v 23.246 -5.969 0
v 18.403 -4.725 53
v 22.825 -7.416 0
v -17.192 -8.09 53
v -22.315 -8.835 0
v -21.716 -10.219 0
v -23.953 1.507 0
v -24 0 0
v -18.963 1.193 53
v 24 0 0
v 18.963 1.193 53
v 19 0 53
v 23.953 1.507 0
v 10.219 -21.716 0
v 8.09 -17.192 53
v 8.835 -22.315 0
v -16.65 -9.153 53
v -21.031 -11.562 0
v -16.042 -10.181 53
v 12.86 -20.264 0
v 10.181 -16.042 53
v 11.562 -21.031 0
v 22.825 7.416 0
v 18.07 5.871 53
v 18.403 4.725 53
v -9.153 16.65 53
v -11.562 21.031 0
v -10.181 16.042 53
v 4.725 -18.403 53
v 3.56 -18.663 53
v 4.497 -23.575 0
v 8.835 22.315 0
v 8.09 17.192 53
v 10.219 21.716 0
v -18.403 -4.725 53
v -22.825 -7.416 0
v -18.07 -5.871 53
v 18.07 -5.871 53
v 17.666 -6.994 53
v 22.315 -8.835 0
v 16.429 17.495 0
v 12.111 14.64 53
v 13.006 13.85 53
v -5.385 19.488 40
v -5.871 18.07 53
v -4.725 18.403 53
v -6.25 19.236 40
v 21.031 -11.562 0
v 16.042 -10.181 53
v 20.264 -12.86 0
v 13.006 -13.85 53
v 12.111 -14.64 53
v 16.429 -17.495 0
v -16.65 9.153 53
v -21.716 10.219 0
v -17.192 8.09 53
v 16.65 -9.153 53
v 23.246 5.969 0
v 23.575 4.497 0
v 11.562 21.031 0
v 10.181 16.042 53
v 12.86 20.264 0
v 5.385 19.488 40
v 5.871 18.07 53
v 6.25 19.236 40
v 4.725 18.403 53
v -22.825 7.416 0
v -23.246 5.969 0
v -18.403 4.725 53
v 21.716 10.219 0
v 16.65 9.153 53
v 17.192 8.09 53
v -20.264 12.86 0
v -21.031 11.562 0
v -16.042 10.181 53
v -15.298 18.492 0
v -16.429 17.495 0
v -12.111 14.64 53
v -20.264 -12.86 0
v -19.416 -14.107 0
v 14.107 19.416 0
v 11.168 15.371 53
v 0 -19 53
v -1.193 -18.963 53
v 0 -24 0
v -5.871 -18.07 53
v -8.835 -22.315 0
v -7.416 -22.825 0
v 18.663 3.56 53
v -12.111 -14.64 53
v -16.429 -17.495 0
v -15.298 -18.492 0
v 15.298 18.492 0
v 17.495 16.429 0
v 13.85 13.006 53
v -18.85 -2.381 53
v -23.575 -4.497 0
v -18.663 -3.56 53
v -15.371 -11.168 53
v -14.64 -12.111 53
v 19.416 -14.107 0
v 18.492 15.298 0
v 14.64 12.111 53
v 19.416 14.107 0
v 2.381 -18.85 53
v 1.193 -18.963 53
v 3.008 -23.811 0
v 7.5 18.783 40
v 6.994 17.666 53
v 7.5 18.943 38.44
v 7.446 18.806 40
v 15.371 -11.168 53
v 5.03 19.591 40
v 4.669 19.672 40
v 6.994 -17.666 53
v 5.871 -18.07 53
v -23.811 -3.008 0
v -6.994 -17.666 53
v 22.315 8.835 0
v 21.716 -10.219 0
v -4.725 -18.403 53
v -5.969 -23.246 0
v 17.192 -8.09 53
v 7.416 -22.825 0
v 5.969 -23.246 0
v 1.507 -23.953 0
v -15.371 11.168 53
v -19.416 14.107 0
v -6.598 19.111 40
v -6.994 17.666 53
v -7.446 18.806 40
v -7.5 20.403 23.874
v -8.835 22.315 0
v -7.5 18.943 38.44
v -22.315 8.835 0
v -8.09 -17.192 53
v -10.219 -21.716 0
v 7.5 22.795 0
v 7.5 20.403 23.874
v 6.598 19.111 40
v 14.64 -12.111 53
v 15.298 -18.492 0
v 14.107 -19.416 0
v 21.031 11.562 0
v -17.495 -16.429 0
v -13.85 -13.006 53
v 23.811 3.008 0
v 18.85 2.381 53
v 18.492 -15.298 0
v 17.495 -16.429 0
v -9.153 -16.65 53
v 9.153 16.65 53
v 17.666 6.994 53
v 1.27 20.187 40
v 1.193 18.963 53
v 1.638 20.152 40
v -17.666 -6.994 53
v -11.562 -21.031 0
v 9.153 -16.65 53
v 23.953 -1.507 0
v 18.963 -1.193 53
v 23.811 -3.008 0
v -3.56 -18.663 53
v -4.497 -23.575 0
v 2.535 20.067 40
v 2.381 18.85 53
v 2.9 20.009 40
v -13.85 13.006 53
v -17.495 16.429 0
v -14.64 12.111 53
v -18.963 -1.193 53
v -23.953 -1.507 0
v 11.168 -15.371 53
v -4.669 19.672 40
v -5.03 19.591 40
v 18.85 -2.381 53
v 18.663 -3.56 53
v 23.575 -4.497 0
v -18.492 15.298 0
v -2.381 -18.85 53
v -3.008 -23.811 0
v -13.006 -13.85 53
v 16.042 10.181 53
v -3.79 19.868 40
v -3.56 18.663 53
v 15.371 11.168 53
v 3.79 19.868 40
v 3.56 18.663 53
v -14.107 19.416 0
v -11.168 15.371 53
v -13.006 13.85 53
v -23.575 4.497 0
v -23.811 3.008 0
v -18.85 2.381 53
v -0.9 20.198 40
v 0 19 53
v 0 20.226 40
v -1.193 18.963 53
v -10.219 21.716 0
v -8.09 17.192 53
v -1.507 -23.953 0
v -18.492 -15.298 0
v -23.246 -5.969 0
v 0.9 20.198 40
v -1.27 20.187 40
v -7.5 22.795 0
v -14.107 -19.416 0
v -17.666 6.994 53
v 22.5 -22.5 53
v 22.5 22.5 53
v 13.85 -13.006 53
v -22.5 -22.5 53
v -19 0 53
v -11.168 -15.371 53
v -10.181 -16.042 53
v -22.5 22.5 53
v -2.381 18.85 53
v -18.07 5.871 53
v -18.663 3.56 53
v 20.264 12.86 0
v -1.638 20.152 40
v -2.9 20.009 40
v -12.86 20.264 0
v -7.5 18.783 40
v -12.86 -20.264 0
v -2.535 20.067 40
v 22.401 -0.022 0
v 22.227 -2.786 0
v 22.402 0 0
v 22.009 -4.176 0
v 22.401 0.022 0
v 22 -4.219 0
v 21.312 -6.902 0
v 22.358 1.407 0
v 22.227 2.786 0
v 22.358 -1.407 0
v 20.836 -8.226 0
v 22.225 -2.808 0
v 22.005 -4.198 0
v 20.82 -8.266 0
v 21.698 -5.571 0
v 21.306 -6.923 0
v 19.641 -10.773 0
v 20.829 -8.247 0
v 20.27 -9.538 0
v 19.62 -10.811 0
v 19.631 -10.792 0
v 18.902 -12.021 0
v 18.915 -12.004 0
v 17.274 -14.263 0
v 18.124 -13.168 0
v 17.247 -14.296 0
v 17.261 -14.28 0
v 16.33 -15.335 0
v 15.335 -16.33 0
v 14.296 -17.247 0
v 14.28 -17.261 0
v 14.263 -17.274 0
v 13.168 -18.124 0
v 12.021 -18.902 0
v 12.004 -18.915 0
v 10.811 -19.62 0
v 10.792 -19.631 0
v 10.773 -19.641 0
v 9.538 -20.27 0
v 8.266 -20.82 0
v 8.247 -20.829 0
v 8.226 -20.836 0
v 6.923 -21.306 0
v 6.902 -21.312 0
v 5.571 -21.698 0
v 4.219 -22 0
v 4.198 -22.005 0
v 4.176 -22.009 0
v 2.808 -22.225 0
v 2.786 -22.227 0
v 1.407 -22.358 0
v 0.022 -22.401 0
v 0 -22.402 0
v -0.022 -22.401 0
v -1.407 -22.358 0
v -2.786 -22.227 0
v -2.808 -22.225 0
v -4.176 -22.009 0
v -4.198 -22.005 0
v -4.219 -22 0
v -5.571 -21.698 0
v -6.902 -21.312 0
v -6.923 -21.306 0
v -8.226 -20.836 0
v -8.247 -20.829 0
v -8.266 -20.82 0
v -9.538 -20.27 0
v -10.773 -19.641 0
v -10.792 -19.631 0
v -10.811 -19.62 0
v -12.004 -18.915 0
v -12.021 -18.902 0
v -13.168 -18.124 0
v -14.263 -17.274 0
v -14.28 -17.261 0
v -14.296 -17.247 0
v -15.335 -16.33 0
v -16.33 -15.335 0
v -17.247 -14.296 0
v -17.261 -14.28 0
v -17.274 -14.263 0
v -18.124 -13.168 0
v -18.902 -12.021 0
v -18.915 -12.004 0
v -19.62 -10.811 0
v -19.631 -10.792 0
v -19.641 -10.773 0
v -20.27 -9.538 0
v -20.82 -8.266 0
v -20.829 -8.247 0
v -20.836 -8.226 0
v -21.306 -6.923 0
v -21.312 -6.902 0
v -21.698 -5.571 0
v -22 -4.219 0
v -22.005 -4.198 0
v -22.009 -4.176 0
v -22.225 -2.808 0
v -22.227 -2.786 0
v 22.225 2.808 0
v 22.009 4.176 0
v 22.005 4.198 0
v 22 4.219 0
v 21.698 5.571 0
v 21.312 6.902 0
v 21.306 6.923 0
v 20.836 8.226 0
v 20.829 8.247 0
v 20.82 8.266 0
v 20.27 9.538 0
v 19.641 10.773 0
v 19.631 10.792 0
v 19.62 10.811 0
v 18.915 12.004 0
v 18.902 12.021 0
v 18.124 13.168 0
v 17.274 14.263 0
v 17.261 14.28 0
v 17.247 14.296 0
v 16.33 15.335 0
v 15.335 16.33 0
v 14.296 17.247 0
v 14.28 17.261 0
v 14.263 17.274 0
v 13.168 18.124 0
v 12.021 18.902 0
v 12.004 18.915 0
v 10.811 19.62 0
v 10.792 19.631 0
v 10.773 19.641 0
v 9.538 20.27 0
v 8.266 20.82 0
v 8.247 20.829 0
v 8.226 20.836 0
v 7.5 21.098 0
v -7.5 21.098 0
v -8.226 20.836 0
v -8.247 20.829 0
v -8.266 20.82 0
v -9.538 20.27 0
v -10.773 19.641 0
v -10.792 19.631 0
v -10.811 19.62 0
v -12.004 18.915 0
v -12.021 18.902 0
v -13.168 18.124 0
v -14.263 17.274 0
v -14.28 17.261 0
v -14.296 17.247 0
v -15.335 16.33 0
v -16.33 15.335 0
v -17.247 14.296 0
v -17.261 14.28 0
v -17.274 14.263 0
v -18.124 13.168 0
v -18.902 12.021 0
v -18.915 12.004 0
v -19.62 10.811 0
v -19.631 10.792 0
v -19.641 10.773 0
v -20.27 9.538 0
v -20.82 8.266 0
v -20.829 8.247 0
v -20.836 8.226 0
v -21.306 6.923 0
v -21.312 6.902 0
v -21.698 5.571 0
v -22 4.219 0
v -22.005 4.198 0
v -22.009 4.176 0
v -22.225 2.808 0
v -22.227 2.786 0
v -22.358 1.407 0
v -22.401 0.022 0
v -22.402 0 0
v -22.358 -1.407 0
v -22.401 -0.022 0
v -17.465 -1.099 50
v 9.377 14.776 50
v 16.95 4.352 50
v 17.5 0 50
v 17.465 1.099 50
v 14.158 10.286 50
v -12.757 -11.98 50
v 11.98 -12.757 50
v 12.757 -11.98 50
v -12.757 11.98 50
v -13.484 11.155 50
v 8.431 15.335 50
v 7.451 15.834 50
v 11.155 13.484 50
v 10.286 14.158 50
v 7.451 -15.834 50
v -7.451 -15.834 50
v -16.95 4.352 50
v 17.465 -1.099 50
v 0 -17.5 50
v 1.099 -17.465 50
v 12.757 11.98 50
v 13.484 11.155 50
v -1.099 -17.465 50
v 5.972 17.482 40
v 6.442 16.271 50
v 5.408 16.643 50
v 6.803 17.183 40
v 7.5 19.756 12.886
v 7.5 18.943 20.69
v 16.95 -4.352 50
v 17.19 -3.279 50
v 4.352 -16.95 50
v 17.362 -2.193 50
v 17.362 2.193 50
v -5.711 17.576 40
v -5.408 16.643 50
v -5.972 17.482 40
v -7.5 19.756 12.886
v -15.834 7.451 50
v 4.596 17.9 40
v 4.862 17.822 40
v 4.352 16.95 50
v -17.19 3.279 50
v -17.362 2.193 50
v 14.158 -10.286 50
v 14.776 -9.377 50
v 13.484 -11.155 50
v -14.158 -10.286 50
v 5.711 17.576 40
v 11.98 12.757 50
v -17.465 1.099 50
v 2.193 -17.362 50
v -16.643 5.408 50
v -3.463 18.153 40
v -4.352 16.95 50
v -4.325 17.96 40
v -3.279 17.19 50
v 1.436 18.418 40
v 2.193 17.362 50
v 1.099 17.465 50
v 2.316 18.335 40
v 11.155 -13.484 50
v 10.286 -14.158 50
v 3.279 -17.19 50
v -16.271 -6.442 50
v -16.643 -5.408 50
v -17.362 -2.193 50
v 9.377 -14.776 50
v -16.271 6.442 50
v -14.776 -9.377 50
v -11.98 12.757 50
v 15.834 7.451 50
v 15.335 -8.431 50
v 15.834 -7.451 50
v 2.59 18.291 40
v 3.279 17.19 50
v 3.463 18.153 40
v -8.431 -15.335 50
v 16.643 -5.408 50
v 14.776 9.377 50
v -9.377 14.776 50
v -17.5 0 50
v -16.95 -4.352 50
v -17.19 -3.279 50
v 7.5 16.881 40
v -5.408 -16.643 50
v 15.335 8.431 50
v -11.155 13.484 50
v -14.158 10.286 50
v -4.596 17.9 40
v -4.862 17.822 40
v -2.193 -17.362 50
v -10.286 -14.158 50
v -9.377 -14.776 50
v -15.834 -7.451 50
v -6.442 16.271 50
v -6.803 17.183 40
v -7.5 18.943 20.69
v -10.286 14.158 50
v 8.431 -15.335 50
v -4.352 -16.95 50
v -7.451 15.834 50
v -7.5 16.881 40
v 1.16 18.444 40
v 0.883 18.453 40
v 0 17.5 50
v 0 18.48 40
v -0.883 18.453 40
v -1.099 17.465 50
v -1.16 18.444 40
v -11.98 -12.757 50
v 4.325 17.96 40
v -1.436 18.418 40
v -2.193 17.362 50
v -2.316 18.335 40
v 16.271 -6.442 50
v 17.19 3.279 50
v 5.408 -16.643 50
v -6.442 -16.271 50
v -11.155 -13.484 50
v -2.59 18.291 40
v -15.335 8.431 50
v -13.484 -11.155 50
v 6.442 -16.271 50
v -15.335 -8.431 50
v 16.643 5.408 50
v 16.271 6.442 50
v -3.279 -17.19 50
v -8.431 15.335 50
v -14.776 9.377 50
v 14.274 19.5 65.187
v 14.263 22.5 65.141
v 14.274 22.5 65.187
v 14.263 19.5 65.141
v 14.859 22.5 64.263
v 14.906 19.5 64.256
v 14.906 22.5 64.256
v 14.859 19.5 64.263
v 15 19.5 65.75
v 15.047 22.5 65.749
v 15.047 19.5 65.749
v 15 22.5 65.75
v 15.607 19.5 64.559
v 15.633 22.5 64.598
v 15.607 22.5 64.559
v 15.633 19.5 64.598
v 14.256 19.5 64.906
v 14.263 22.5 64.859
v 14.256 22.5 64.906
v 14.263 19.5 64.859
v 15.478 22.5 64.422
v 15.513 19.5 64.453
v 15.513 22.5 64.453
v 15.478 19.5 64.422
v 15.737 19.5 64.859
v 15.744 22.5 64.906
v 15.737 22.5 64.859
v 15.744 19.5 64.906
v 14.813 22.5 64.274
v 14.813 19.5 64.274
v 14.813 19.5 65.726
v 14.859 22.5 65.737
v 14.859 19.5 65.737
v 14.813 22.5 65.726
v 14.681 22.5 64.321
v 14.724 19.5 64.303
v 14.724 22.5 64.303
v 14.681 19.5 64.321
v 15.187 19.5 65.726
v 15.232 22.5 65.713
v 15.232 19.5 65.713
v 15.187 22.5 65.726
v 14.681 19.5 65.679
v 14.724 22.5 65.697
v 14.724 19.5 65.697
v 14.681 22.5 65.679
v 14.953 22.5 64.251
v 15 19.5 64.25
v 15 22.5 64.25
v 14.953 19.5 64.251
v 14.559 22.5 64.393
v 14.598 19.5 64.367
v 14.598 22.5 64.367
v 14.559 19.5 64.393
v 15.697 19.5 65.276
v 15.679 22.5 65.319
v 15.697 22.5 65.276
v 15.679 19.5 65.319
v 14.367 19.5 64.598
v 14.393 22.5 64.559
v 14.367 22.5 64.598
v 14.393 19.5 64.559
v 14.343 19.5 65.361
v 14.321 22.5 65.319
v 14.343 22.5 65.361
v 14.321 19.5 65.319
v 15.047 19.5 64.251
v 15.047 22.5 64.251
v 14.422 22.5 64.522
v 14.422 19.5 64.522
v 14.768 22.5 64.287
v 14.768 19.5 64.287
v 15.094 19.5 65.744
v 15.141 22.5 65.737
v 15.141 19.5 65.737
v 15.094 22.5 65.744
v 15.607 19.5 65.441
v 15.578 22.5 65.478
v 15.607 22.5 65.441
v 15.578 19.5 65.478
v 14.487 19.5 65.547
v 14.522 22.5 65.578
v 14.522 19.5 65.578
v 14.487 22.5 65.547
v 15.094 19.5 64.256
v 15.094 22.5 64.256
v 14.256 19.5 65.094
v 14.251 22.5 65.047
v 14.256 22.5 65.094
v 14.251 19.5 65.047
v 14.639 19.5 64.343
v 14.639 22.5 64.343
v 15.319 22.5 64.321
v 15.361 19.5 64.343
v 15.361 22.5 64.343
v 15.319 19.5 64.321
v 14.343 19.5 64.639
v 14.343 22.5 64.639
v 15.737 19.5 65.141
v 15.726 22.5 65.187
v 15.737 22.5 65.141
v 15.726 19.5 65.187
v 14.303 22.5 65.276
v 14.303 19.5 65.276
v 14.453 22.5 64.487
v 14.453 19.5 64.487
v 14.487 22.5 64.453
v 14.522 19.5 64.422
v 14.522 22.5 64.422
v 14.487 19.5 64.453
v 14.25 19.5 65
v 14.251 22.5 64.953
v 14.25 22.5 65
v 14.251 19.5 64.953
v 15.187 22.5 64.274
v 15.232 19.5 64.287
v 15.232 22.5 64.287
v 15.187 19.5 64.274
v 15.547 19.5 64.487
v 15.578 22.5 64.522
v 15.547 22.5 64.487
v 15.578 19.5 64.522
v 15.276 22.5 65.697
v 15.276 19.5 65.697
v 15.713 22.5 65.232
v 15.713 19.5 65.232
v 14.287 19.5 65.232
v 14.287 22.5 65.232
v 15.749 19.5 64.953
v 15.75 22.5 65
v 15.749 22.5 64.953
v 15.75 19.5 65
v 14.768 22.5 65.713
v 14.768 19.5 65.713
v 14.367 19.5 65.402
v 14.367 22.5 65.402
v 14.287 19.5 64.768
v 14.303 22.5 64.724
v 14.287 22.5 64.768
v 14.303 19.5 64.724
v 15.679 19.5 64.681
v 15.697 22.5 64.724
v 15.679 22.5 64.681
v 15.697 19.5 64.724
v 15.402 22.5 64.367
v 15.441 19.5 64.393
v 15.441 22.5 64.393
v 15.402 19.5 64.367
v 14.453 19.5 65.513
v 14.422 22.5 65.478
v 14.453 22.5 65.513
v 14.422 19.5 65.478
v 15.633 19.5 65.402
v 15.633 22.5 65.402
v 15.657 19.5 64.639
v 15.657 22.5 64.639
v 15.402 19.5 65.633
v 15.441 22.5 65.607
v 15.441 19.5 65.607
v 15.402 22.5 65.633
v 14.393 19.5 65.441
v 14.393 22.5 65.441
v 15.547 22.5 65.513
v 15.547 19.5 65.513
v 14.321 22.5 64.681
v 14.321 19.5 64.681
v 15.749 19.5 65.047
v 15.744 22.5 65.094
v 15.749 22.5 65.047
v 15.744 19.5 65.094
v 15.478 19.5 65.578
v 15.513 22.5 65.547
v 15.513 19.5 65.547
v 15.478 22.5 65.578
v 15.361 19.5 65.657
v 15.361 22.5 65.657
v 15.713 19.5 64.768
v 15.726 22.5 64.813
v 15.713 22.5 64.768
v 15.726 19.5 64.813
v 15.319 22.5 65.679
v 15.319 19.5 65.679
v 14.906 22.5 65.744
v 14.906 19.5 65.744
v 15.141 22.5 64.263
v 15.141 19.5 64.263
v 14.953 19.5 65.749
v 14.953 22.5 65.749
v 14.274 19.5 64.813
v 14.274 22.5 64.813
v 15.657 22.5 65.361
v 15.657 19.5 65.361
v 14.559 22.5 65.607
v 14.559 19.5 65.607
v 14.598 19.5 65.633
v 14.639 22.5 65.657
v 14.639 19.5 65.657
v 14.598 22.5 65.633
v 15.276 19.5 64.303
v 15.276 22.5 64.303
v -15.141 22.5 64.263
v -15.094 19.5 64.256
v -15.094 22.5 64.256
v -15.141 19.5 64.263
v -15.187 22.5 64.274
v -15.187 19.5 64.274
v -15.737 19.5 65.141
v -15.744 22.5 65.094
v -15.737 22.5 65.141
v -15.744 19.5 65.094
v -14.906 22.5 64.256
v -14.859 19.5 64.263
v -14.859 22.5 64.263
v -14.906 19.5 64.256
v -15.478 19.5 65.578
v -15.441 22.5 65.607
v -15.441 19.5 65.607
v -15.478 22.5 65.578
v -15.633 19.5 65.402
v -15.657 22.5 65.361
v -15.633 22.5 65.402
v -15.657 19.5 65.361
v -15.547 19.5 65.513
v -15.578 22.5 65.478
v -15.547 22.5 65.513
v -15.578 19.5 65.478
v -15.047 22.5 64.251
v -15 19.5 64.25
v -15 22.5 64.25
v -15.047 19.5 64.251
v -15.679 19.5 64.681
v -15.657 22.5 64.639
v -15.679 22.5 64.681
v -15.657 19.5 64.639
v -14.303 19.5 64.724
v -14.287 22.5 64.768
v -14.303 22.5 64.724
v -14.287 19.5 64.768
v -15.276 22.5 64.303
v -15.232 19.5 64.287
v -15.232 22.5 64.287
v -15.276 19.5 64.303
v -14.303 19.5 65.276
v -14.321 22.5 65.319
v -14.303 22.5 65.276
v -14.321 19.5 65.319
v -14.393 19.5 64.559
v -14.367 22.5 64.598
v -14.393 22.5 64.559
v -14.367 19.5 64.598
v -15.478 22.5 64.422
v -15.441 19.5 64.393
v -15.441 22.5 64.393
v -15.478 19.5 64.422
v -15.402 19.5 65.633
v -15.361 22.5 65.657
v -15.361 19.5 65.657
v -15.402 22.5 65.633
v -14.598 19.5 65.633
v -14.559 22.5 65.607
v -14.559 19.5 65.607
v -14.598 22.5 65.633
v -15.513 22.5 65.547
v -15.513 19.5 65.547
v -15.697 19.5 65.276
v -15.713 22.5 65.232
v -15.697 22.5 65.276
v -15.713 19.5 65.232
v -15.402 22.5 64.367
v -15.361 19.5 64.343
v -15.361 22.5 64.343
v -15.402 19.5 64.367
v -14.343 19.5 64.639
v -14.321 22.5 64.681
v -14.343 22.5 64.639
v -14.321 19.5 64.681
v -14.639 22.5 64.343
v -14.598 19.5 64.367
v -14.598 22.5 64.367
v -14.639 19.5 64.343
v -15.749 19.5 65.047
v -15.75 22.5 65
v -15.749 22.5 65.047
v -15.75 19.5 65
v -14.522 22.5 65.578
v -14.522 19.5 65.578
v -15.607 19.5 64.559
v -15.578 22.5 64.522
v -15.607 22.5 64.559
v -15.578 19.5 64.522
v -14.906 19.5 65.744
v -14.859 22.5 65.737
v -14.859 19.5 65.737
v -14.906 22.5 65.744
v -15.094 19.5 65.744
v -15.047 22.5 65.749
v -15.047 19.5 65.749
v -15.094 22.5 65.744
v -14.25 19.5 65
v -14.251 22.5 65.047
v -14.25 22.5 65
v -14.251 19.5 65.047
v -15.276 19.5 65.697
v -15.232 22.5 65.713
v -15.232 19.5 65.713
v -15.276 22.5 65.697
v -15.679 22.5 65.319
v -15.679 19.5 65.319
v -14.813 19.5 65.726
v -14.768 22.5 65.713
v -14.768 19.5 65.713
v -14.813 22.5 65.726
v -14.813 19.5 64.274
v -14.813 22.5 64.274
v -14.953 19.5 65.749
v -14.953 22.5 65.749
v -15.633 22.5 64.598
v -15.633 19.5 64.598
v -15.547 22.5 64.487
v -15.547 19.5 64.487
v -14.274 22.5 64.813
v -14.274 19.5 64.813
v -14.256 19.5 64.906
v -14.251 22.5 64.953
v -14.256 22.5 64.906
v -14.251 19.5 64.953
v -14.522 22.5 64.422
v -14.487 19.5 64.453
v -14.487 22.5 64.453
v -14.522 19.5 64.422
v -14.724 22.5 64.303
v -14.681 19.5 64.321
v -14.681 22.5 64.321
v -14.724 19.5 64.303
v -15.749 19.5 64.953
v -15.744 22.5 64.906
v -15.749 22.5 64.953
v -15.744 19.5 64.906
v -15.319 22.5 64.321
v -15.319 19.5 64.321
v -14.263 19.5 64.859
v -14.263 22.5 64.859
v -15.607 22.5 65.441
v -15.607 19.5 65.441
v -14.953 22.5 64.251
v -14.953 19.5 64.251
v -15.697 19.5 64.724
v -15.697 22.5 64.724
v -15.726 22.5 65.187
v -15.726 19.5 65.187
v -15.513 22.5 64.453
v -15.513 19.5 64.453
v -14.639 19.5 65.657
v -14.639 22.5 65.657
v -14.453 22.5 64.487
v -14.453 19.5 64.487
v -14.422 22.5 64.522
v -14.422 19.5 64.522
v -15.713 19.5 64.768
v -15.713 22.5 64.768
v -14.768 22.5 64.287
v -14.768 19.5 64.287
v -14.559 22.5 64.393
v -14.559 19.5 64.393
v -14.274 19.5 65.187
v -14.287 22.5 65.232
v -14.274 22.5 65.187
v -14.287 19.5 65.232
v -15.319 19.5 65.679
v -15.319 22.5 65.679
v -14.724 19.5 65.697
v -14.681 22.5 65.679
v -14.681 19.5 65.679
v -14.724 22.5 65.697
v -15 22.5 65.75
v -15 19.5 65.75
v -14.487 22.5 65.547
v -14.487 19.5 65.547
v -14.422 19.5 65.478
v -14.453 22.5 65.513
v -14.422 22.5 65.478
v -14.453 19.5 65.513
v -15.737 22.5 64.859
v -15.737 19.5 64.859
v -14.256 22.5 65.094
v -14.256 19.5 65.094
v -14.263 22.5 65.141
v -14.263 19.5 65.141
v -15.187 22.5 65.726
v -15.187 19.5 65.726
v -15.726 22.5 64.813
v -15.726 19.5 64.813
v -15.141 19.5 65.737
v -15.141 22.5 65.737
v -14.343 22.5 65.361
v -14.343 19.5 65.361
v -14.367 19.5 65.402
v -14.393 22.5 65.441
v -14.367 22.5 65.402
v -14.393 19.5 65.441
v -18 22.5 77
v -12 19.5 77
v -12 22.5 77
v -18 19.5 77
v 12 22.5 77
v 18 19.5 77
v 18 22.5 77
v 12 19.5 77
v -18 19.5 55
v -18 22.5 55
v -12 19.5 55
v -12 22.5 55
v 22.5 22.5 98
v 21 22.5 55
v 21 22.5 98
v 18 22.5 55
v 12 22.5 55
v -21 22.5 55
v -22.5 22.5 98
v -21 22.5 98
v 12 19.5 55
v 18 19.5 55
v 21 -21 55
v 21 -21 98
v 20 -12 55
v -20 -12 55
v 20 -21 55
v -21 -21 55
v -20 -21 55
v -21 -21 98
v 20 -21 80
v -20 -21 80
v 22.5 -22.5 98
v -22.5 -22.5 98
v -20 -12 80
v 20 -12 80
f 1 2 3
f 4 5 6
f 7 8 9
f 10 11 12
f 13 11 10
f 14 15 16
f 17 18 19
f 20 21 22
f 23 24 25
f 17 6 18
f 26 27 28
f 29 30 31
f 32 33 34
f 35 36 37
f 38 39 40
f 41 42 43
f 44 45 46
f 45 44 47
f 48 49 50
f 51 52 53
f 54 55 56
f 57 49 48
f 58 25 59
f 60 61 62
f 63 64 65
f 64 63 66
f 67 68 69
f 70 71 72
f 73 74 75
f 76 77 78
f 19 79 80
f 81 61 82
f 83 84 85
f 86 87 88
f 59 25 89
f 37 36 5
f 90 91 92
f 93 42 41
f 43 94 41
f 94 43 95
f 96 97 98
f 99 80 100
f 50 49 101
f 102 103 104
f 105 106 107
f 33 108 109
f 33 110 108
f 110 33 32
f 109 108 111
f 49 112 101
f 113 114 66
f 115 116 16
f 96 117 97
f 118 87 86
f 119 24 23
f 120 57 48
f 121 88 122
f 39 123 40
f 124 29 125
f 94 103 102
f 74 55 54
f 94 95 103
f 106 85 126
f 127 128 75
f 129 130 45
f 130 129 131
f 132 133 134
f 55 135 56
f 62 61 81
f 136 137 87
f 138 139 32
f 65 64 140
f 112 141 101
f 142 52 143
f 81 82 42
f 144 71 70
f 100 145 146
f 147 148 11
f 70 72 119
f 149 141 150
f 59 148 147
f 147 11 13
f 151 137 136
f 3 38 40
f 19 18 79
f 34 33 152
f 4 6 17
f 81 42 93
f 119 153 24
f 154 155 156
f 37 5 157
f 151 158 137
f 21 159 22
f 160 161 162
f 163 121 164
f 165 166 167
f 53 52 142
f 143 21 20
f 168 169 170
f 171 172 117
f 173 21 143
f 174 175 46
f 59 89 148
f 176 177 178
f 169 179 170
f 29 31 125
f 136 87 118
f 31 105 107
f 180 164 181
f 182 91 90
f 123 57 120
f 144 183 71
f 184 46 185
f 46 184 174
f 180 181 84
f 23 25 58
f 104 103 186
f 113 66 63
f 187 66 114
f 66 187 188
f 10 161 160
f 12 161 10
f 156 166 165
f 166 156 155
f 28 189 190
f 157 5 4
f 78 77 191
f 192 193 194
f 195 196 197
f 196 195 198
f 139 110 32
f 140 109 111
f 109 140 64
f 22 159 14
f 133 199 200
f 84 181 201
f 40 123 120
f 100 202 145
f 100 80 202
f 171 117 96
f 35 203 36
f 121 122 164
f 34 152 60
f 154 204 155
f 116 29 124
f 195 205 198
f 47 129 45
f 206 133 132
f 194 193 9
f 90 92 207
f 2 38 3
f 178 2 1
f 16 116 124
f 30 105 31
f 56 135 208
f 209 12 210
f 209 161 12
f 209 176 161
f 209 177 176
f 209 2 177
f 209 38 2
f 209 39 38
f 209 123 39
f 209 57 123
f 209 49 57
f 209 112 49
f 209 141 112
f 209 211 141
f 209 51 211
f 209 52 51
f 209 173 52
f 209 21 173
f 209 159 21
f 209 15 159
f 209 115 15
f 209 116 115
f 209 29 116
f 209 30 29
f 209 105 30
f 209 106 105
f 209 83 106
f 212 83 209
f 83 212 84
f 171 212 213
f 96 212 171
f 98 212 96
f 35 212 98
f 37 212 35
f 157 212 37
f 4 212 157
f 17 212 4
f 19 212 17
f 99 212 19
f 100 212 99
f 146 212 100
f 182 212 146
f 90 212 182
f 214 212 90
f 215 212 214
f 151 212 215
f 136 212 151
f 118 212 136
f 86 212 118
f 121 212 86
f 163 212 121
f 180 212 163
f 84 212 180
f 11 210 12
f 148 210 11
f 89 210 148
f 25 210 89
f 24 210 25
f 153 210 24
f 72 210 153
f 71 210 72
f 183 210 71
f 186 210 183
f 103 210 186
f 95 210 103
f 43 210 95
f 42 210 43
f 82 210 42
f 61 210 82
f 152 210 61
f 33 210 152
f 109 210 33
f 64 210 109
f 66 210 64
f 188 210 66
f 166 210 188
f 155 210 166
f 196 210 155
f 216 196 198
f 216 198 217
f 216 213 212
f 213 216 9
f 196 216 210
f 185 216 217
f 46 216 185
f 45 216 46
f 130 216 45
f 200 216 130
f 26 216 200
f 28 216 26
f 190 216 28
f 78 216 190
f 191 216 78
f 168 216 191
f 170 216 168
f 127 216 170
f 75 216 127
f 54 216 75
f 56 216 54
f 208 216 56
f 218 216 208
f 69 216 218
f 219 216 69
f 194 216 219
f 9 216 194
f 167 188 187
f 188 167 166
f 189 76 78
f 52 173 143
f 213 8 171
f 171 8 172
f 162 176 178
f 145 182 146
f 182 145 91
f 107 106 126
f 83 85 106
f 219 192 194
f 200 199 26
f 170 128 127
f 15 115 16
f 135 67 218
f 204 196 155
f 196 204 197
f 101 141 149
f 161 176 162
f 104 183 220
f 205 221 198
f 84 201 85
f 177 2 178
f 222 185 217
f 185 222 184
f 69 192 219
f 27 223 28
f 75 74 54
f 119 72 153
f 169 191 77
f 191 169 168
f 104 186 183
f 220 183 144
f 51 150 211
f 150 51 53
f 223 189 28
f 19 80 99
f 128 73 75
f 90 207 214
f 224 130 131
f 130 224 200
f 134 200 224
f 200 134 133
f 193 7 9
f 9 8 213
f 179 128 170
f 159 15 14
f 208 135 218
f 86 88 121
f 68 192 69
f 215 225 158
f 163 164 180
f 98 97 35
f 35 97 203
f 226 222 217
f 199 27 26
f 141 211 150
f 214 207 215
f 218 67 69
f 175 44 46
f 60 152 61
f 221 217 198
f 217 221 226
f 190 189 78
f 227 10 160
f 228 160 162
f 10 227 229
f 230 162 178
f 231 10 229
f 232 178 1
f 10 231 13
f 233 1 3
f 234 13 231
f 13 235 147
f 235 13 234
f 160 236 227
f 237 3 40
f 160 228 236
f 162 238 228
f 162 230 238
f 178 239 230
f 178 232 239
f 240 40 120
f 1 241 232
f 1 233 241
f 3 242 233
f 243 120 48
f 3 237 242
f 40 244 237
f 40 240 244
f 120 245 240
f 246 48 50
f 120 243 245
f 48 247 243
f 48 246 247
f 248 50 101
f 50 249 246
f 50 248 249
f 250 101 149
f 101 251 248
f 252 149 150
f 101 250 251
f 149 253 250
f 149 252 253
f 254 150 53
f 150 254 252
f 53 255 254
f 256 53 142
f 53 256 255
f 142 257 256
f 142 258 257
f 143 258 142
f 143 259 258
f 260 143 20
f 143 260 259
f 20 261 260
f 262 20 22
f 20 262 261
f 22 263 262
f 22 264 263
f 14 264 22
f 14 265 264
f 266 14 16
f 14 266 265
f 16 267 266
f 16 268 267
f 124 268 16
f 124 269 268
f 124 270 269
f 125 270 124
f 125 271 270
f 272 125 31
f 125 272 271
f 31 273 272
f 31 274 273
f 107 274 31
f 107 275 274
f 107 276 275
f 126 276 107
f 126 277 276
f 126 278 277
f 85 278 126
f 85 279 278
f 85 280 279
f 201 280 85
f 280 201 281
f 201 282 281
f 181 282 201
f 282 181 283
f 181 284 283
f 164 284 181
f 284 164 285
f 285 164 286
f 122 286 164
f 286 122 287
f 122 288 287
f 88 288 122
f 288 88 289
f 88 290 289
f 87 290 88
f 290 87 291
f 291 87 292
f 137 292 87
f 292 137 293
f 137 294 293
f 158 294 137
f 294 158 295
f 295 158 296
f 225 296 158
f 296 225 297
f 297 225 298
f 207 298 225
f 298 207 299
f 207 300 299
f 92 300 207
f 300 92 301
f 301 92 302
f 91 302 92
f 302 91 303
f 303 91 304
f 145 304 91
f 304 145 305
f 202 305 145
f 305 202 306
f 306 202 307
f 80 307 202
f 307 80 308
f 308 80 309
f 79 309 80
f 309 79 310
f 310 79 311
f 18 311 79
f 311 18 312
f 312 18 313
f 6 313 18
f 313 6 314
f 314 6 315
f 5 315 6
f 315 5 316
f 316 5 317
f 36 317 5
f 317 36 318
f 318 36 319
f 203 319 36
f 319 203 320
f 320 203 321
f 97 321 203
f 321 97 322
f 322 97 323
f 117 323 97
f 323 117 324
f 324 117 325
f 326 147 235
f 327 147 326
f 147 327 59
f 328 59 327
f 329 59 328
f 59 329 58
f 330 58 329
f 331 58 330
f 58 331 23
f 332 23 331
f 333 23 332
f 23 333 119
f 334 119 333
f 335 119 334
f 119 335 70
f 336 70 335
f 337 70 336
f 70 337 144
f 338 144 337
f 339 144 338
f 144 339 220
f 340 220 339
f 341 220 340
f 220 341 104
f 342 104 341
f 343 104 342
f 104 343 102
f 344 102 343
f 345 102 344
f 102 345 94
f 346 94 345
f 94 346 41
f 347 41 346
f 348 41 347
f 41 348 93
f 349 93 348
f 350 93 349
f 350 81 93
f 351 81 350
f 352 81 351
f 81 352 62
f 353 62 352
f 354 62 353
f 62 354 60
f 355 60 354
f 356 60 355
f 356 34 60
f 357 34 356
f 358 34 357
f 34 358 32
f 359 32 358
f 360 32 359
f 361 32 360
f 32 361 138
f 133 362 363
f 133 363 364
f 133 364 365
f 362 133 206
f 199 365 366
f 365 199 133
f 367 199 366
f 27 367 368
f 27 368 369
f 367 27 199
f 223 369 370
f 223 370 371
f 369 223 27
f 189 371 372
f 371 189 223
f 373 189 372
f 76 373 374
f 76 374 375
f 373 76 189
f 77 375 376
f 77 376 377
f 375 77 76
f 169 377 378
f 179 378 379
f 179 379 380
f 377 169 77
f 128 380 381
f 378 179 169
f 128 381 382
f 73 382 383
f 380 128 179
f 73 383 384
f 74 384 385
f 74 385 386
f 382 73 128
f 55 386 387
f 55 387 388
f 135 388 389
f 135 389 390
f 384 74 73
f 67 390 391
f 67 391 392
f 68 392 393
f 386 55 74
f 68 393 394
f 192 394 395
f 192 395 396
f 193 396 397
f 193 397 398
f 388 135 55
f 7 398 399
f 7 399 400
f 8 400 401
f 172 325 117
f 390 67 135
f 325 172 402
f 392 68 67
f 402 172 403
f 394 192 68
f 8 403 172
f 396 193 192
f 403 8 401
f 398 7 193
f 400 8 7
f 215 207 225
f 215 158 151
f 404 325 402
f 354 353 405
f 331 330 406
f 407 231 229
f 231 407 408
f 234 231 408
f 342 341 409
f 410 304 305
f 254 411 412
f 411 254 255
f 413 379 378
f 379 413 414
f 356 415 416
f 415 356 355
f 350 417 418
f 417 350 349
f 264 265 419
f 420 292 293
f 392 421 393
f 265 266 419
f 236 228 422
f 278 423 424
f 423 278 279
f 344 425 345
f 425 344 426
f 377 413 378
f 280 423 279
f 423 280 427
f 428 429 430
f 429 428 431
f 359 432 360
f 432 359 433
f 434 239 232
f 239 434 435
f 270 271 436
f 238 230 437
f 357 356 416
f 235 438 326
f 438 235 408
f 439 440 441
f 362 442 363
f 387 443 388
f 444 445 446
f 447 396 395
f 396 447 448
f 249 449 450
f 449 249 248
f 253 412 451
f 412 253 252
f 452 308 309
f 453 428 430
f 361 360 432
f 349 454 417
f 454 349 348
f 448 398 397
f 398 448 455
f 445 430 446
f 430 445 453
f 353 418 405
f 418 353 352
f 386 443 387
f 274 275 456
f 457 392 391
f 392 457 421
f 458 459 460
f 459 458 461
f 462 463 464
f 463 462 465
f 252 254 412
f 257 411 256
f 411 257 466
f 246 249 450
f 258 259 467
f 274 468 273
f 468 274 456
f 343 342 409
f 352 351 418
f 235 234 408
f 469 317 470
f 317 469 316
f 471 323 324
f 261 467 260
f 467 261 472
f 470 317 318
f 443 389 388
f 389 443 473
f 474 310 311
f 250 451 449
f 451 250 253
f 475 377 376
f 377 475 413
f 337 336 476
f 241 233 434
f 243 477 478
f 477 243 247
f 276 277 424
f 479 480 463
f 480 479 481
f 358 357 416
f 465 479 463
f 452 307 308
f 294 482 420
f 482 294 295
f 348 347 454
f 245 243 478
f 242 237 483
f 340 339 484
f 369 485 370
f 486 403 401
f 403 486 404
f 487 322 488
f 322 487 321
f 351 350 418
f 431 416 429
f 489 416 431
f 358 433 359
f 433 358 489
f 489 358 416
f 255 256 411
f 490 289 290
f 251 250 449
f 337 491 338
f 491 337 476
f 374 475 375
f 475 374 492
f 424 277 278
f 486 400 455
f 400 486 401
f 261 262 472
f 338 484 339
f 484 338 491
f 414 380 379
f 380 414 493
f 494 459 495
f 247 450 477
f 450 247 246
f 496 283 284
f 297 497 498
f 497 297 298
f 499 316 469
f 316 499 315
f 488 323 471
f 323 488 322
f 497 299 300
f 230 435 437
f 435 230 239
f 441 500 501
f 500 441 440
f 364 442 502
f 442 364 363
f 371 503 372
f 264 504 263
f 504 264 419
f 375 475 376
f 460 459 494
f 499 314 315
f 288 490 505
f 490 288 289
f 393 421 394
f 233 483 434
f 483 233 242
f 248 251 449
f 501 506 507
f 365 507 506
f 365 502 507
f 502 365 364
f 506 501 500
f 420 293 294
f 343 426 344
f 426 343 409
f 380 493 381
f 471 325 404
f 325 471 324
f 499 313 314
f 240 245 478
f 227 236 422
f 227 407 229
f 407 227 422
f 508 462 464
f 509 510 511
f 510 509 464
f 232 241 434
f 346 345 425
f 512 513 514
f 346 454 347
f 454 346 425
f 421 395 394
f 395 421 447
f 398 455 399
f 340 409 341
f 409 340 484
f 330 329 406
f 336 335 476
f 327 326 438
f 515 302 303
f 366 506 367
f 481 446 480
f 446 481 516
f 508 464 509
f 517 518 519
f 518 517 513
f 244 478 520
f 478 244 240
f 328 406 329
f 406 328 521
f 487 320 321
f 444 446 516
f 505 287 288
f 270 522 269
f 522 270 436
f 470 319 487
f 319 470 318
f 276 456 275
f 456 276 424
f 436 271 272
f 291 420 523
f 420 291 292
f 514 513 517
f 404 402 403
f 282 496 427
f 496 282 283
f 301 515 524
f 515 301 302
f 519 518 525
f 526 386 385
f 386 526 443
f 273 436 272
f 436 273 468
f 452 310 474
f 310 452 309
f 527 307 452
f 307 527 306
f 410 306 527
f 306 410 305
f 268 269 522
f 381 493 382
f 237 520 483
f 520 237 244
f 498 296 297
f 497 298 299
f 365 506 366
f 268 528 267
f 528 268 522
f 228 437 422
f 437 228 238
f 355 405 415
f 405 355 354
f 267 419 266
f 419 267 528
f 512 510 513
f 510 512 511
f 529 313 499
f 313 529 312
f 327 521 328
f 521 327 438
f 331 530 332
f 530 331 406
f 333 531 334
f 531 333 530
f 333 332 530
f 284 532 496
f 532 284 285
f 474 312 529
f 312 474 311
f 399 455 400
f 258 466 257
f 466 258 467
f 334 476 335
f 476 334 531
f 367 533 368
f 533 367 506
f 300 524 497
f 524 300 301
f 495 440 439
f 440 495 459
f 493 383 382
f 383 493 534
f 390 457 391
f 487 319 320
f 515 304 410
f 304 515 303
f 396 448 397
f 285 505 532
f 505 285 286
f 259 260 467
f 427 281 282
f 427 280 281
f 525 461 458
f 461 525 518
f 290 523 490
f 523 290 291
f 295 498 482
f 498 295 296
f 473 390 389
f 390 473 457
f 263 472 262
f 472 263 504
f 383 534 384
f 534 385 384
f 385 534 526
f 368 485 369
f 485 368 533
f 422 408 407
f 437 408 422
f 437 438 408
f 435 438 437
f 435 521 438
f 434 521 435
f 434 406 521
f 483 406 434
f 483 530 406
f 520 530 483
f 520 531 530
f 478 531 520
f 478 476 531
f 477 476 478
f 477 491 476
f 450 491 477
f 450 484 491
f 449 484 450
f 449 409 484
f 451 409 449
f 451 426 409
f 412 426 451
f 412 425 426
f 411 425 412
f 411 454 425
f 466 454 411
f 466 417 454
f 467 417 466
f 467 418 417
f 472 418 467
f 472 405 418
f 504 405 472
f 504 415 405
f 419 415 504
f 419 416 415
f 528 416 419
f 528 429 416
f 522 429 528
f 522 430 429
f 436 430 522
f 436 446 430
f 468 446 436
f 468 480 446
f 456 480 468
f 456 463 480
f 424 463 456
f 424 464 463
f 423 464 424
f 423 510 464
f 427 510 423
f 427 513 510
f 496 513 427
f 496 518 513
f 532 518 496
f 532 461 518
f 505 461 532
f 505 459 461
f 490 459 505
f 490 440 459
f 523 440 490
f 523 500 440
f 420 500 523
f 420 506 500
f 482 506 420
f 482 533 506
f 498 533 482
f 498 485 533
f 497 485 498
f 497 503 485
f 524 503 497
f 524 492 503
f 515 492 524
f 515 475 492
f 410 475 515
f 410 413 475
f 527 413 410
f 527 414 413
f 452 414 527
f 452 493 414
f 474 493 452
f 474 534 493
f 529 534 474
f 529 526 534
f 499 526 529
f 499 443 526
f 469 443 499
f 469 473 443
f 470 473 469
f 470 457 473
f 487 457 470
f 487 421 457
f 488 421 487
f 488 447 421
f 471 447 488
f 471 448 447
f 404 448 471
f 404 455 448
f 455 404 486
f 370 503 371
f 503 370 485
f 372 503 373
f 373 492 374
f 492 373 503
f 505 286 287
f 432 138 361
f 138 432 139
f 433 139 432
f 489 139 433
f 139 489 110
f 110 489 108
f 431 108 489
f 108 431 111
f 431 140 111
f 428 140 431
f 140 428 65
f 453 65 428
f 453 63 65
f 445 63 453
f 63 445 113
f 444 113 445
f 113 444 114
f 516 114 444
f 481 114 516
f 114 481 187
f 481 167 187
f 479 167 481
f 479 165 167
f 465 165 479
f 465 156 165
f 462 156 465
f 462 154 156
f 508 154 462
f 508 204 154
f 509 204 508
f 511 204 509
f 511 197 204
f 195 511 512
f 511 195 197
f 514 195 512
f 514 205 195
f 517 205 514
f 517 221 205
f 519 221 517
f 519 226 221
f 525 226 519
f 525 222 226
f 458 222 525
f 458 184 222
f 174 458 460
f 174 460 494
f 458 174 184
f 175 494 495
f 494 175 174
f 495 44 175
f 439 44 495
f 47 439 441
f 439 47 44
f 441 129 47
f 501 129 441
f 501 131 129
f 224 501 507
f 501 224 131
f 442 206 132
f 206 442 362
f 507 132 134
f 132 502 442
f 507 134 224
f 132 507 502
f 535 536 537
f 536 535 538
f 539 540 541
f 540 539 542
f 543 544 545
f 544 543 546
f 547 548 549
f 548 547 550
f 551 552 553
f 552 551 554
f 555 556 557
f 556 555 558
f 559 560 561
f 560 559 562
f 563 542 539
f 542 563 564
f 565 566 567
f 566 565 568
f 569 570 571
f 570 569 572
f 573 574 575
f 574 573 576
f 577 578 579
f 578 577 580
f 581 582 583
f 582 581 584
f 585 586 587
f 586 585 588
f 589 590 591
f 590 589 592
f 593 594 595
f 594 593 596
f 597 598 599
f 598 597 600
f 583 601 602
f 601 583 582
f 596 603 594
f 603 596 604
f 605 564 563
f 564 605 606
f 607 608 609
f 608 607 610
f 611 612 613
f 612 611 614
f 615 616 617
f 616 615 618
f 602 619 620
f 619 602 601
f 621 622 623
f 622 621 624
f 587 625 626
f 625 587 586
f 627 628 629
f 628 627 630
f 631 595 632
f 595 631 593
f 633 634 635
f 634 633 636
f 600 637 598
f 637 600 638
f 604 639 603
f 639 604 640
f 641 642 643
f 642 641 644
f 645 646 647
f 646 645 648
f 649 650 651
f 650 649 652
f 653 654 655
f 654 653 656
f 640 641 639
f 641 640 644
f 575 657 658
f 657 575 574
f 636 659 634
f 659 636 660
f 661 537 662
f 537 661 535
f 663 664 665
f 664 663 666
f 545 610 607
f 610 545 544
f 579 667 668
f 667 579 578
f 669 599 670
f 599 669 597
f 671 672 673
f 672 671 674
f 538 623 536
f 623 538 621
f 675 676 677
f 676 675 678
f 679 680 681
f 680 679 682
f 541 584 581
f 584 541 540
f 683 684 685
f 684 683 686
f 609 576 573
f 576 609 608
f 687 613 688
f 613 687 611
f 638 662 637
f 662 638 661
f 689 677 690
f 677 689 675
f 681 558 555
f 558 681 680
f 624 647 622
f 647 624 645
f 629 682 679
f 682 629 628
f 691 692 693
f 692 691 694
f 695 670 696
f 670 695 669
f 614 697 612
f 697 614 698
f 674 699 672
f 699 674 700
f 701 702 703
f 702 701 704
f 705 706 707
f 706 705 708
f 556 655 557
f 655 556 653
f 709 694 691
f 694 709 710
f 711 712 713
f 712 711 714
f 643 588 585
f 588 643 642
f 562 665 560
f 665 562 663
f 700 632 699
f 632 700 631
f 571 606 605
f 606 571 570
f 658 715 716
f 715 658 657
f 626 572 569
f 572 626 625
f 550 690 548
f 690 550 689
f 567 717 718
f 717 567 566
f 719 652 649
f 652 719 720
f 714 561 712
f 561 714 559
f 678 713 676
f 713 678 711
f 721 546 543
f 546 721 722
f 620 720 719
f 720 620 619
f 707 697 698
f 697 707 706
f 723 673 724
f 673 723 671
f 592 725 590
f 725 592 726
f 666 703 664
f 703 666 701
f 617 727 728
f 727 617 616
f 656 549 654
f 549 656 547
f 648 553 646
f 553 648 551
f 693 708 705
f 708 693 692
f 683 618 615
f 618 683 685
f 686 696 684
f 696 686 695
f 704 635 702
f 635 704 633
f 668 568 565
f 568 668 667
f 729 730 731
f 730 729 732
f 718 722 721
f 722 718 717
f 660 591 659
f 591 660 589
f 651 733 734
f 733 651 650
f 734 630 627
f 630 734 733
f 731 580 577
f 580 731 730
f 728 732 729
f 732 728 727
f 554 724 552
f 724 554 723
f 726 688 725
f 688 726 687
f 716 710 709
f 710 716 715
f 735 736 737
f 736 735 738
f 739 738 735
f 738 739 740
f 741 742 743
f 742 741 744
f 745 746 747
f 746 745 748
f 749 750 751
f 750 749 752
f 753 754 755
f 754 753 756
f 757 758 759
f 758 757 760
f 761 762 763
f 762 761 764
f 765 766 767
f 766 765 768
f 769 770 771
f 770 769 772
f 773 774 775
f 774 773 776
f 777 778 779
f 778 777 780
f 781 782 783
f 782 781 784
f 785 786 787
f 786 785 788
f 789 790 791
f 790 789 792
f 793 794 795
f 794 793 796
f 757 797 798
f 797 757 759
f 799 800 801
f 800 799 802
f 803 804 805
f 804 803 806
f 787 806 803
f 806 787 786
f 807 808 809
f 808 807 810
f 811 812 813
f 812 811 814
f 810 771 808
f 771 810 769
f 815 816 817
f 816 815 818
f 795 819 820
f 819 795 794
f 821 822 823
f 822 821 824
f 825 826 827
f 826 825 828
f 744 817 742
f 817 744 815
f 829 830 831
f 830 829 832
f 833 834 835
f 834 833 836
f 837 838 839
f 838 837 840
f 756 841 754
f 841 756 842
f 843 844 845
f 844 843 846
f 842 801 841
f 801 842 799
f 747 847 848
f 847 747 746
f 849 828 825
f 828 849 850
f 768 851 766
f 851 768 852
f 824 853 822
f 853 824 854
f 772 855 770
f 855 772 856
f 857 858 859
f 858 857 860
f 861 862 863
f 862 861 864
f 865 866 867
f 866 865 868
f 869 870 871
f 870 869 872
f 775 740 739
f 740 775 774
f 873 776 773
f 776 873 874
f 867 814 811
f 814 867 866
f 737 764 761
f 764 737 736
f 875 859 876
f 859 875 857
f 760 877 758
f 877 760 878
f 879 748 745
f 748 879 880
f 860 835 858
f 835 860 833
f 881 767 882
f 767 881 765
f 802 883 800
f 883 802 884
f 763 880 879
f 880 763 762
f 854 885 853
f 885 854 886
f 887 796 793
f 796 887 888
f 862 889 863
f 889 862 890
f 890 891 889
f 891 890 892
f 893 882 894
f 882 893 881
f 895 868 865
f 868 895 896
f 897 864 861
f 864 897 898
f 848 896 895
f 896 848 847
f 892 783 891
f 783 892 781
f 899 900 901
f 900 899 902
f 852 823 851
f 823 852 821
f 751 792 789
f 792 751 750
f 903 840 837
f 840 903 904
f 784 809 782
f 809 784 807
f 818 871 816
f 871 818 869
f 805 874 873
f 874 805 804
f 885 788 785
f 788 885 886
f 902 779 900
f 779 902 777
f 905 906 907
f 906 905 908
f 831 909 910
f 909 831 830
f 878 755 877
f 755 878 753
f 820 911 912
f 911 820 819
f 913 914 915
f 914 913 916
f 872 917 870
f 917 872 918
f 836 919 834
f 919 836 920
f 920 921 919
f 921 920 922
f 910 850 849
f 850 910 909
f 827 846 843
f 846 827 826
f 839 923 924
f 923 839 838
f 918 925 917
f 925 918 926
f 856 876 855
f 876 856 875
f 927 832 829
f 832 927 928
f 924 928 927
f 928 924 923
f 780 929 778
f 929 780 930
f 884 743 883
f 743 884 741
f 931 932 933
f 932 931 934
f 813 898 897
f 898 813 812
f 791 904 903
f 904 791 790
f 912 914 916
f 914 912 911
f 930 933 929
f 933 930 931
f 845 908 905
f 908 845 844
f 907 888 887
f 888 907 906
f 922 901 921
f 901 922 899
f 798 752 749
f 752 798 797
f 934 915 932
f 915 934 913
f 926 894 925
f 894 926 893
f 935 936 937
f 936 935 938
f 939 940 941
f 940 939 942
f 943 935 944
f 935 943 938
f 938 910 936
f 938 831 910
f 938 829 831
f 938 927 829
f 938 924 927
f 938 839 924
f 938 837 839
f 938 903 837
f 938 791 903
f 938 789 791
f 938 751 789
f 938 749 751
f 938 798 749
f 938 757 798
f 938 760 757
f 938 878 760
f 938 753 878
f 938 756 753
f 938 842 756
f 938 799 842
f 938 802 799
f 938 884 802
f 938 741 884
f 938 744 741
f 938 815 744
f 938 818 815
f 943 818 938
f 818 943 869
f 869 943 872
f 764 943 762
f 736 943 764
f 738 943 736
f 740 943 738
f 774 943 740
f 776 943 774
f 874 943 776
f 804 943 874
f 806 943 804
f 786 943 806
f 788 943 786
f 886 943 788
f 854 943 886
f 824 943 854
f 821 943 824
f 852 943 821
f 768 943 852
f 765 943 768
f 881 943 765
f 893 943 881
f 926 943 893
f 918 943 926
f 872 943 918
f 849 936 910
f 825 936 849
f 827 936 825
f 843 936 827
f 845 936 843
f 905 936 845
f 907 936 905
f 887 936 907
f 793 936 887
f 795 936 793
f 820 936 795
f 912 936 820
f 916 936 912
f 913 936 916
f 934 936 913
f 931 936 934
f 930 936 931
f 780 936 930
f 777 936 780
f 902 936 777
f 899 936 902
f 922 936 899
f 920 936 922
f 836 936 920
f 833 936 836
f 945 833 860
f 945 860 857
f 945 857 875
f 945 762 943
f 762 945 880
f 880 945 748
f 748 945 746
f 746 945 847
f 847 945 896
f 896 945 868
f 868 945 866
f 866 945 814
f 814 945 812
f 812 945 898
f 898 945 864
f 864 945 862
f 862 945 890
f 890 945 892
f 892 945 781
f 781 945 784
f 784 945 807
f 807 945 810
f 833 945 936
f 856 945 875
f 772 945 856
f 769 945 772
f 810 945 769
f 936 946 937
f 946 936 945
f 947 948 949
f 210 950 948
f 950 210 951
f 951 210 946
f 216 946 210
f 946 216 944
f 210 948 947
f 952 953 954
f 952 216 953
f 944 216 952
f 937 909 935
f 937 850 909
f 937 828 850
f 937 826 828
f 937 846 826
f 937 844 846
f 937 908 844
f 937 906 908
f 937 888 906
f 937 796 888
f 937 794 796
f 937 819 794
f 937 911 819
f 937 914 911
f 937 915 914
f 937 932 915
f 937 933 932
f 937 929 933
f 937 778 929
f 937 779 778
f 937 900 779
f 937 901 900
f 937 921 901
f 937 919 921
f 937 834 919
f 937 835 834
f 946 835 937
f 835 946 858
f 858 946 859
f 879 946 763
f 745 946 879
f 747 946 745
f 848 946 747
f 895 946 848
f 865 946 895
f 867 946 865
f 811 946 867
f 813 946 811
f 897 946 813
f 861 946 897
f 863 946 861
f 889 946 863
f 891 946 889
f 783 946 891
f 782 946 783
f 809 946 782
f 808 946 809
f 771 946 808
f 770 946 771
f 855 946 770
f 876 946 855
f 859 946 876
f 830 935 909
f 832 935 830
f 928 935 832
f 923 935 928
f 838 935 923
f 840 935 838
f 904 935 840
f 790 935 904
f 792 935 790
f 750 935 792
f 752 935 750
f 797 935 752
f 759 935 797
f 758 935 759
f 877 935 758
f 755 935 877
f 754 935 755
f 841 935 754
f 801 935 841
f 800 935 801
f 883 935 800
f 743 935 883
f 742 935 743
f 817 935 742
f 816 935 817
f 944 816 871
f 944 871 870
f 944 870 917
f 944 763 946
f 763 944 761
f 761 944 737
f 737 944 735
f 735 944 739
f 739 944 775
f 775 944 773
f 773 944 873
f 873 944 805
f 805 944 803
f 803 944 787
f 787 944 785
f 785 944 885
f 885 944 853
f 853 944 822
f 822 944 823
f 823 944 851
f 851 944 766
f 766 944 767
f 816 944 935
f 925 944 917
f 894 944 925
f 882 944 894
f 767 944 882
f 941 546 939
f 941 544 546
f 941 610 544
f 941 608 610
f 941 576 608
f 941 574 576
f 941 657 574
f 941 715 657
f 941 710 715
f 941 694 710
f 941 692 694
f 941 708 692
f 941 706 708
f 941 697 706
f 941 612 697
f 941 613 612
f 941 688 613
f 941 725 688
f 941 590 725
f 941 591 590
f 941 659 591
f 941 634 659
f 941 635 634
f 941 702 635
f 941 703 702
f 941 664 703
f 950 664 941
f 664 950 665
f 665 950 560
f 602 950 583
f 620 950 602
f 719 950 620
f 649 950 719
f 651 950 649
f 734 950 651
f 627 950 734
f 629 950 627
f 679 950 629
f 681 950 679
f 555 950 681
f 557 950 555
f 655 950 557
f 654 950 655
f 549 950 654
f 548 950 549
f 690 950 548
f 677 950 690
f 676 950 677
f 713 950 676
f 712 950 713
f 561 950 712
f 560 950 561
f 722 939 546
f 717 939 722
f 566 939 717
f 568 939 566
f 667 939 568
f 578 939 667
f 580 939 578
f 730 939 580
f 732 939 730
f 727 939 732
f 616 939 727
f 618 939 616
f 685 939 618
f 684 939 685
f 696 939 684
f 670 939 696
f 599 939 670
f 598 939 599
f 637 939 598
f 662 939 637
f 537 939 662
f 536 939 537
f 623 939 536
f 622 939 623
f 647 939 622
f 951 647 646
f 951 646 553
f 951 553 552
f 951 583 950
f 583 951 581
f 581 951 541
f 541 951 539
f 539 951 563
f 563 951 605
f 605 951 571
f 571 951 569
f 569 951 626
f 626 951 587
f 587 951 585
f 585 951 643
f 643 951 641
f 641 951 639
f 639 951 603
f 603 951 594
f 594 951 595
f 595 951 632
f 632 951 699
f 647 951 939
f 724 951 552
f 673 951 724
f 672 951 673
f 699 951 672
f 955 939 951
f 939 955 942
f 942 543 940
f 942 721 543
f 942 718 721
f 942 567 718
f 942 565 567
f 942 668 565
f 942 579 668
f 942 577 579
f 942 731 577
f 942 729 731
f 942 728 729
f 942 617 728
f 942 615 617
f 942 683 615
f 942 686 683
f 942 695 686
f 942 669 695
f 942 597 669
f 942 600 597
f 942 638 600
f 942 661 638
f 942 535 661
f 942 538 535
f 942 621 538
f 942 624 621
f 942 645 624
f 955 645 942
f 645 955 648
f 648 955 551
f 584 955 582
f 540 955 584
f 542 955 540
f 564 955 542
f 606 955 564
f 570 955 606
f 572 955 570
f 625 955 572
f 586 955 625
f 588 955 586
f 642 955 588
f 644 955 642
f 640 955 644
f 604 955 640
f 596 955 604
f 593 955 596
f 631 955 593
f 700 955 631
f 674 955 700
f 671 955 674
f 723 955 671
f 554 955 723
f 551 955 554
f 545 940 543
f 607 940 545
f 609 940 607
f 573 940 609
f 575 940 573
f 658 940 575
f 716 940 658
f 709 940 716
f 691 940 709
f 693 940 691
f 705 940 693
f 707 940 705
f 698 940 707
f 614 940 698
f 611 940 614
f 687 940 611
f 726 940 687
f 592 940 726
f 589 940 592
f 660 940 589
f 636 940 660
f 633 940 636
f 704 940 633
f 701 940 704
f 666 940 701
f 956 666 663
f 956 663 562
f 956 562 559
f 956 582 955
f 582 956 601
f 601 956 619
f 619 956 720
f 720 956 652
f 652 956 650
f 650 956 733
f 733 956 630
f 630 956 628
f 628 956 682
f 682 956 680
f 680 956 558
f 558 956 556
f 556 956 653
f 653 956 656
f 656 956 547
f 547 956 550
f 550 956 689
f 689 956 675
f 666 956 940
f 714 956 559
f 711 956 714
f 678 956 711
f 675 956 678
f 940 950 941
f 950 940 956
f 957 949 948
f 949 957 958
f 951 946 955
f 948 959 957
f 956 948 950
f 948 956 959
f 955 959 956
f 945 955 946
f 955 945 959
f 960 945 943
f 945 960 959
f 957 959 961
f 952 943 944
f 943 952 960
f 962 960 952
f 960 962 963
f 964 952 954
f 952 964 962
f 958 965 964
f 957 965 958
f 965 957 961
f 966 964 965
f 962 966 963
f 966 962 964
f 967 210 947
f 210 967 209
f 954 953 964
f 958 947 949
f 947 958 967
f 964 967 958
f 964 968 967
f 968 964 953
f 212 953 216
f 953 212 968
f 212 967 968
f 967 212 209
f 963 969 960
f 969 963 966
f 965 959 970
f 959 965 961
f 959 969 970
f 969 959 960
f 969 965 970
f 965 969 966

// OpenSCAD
$fn=100;

topCone();
translate([18, 19.5, 53]) rotate([0, 0, 90]) pirPegs();
translate([-20, -12, 55]) rotate([90, 0, 0]) color("green") cube([40, 25, 10]);

translate([-45/2, -45/2, 53]) difference() {
    cube([45, 45, 45]);
    union() {
        translate([1.5, 1.5, 2]) cube([42, 42, 50]);
        translate([1.5, 43, 2]) cube([42, 3, 48]);
    }
}

//translate([0,6.5,0]) cube([4,23,23]);

module pirPegs() {
    difference() {
        linear_extrude(24) {
            square([3,6]);
            translate([0, 30, 0]) square([3,6]);
        }
        translate([0, 3, 0]) union() {
            translate([-1, 0, 12]) rotate([0, 90, 0]) cylinder(h=5, d=1.5);
            translate([-1, 30, 12]) rotate([0, 90, 0]) cylinder(h=5, d=1.5);
        }
    }
}


module topCone() {
    difference() {
        difference() {
            cylinder(h=53, d1=48, d2=38);
            translate([0, 0, -1]) cylinder(h=51, d1=45, d2=35);
        }
        translate([-7.5, 0, -1]) cube([15,40,41]);
    }
}
